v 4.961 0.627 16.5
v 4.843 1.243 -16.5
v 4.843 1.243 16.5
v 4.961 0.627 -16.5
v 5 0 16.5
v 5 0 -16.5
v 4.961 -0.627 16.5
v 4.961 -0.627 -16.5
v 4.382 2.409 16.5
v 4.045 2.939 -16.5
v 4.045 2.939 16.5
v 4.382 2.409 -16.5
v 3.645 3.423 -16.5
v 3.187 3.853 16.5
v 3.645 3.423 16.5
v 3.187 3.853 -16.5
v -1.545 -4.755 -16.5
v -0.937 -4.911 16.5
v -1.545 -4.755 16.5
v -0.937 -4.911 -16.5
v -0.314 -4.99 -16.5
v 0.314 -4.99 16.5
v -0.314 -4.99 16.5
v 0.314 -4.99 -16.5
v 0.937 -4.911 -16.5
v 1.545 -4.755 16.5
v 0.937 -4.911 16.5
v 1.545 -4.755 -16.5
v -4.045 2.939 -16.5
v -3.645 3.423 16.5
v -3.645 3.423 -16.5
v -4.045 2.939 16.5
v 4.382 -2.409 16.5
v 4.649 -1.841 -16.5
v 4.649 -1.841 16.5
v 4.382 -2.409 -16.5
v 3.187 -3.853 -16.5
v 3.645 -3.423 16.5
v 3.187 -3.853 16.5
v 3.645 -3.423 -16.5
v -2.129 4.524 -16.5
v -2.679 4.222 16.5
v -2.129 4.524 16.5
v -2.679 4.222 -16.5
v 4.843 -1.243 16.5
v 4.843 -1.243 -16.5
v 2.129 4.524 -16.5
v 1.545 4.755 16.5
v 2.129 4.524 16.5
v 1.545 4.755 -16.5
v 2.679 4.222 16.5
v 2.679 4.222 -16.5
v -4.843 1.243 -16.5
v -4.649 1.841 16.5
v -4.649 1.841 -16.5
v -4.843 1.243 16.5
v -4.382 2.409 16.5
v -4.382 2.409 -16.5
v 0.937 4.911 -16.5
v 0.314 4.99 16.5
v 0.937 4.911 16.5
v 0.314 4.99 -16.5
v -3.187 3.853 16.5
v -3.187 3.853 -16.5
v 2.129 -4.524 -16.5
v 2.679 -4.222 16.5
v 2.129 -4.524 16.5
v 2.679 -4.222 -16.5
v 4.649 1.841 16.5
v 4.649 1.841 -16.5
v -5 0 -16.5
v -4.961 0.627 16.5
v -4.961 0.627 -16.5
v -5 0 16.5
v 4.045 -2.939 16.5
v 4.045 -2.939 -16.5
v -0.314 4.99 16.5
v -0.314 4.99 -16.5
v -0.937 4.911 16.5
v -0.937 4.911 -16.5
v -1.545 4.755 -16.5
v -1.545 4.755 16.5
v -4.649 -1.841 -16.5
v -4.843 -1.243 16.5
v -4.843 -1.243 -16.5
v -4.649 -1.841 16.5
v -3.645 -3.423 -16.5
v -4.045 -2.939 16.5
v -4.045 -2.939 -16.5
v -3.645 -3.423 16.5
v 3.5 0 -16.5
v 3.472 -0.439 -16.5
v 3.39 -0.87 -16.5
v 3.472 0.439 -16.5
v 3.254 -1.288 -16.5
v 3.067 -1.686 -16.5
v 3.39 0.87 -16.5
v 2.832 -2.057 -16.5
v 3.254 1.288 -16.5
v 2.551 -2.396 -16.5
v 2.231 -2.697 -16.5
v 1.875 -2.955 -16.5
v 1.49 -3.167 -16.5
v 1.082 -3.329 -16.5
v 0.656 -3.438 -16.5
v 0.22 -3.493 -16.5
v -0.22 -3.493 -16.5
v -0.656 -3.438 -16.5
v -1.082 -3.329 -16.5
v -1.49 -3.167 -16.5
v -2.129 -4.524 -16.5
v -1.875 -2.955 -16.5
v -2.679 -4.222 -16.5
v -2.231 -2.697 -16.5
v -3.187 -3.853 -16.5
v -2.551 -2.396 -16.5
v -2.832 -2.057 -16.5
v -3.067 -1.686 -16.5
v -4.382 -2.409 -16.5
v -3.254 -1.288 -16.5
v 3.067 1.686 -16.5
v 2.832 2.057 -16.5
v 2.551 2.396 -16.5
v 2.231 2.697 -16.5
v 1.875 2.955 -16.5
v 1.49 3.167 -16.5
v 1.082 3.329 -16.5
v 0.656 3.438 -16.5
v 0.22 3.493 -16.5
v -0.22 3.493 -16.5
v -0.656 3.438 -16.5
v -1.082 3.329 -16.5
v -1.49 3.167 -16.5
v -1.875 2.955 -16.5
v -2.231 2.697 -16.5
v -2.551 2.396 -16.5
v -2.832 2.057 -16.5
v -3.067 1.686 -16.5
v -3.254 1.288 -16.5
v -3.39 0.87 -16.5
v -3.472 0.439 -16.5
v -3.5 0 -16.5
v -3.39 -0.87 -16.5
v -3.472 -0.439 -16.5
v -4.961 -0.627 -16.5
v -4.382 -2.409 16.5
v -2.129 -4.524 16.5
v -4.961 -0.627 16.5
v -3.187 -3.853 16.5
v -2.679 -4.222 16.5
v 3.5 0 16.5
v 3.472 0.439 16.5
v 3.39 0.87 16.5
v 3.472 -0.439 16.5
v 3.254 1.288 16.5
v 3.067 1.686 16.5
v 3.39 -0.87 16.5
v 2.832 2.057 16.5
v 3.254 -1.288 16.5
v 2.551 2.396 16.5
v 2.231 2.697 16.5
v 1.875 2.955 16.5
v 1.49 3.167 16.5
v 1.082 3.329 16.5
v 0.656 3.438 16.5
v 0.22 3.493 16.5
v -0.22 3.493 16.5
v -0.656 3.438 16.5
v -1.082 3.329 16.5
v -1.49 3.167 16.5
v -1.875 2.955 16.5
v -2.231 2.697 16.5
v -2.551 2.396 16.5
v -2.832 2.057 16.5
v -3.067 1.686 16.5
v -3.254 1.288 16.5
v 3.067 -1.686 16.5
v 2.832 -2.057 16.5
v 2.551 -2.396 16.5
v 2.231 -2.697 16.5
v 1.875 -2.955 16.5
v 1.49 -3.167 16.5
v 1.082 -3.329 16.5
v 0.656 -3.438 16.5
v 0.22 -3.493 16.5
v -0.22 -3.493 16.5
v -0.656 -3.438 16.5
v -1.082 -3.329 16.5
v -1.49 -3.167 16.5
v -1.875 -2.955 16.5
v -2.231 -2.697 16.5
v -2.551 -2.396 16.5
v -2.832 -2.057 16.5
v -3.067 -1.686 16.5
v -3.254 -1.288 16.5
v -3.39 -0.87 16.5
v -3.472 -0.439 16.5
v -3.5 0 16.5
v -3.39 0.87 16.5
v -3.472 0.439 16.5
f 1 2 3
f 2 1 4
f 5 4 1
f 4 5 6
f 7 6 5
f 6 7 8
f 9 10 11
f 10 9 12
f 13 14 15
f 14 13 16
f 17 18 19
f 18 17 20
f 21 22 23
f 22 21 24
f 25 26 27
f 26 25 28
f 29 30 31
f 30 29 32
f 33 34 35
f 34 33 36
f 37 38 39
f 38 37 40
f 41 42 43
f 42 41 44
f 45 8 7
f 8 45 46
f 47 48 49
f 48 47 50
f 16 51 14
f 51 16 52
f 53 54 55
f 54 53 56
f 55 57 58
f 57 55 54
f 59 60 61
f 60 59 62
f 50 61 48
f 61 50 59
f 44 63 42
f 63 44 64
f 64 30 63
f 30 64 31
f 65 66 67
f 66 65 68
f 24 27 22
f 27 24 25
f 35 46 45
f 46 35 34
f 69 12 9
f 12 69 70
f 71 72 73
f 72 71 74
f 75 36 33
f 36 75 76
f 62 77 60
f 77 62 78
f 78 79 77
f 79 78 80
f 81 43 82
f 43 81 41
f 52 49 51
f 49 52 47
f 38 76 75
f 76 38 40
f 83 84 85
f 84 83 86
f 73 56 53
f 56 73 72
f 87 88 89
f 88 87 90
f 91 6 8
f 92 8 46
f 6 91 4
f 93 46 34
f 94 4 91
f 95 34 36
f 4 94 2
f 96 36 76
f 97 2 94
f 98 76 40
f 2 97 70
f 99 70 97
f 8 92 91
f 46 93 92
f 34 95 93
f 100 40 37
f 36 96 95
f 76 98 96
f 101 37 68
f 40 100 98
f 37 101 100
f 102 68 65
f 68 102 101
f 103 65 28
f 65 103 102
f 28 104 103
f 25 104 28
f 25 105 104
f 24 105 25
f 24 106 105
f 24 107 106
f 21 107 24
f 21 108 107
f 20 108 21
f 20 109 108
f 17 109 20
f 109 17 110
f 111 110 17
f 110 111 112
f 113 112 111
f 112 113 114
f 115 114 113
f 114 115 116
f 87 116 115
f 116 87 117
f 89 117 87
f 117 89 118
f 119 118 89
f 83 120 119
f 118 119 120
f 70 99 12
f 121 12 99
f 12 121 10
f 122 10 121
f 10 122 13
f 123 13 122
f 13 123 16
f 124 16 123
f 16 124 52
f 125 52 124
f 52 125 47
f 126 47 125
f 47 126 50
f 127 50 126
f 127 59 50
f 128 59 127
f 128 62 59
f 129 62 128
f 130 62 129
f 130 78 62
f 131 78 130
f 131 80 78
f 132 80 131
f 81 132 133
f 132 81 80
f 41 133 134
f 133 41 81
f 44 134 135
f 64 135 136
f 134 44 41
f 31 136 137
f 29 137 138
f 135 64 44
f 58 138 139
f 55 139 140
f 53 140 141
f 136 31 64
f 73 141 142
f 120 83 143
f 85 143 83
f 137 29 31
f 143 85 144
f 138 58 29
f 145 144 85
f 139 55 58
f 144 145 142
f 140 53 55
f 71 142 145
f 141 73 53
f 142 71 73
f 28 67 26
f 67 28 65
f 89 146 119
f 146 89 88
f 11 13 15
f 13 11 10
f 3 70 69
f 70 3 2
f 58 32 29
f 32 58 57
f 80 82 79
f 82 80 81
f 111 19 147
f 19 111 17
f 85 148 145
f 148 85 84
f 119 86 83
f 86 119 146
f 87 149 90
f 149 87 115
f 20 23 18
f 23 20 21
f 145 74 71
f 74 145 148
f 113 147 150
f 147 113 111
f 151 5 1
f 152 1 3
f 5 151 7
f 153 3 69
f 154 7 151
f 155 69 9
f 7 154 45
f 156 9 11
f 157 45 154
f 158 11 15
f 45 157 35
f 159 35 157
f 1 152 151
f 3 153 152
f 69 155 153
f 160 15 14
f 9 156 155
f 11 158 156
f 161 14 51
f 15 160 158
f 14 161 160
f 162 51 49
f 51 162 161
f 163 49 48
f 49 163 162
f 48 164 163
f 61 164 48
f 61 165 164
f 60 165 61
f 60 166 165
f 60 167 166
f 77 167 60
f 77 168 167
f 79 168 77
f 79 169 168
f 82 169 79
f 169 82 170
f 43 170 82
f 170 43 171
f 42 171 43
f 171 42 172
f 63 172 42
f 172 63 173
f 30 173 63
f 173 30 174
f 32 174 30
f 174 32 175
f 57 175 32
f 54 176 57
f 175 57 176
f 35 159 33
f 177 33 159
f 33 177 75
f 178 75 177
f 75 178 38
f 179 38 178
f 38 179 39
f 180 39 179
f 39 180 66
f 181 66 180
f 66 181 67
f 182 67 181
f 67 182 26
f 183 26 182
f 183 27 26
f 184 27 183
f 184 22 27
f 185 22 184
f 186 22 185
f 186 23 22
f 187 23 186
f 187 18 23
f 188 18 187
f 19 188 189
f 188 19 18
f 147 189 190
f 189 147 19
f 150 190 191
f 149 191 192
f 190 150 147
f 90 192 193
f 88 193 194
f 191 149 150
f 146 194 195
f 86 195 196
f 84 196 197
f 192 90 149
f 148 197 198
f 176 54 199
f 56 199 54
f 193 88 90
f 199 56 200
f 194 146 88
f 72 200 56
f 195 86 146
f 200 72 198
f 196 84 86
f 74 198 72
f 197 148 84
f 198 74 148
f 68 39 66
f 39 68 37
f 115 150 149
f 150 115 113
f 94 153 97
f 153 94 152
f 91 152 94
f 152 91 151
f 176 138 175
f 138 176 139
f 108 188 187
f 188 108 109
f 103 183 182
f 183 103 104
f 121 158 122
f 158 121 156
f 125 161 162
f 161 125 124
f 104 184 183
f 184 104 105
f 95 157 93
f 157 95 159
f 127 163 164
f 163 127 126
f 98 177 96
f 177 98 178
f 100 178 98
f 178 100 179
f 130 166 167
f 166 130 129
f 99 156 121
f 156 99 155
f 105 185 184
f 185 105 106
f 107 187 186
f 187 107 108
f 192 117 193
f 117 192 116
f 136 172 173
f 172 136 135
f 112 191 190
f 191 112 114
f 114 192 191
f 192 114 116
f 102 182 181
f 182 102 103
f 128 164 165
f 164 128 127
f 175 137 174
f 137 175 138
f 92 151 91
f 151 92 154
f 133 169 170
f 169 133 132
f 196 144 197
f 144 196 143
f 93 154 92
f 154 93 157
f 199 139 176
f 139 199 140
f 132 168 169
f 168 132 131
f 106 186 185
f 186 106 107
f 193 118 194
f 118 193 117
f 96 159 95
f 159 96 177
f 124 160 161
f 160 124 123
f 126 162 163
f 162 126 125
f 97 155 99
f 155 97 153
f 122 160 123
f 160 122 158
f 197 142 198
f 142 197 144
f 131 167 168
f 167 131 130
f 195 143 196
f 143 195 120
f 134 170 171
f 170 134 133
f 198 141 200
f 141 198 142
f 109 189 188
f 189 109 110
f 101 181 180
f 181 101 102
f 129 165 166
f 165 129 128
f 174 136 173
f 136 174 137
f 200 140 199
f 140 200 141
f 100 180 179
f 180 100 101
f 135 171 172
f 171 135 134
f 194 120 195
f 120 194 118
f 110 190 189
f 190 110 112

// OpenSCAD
$fn = 50;


difference() {
	union() {
		translate(v = [0, 0, -16.5000000000]) {
			cylinder(h = 33, r = 5.0000000000);
		}
	}
	union() {
		translate(v = [0, 0, -100.0000000000]) {
			cylinder(h = 200, r = 3.5000000000);
		}
	}
}
